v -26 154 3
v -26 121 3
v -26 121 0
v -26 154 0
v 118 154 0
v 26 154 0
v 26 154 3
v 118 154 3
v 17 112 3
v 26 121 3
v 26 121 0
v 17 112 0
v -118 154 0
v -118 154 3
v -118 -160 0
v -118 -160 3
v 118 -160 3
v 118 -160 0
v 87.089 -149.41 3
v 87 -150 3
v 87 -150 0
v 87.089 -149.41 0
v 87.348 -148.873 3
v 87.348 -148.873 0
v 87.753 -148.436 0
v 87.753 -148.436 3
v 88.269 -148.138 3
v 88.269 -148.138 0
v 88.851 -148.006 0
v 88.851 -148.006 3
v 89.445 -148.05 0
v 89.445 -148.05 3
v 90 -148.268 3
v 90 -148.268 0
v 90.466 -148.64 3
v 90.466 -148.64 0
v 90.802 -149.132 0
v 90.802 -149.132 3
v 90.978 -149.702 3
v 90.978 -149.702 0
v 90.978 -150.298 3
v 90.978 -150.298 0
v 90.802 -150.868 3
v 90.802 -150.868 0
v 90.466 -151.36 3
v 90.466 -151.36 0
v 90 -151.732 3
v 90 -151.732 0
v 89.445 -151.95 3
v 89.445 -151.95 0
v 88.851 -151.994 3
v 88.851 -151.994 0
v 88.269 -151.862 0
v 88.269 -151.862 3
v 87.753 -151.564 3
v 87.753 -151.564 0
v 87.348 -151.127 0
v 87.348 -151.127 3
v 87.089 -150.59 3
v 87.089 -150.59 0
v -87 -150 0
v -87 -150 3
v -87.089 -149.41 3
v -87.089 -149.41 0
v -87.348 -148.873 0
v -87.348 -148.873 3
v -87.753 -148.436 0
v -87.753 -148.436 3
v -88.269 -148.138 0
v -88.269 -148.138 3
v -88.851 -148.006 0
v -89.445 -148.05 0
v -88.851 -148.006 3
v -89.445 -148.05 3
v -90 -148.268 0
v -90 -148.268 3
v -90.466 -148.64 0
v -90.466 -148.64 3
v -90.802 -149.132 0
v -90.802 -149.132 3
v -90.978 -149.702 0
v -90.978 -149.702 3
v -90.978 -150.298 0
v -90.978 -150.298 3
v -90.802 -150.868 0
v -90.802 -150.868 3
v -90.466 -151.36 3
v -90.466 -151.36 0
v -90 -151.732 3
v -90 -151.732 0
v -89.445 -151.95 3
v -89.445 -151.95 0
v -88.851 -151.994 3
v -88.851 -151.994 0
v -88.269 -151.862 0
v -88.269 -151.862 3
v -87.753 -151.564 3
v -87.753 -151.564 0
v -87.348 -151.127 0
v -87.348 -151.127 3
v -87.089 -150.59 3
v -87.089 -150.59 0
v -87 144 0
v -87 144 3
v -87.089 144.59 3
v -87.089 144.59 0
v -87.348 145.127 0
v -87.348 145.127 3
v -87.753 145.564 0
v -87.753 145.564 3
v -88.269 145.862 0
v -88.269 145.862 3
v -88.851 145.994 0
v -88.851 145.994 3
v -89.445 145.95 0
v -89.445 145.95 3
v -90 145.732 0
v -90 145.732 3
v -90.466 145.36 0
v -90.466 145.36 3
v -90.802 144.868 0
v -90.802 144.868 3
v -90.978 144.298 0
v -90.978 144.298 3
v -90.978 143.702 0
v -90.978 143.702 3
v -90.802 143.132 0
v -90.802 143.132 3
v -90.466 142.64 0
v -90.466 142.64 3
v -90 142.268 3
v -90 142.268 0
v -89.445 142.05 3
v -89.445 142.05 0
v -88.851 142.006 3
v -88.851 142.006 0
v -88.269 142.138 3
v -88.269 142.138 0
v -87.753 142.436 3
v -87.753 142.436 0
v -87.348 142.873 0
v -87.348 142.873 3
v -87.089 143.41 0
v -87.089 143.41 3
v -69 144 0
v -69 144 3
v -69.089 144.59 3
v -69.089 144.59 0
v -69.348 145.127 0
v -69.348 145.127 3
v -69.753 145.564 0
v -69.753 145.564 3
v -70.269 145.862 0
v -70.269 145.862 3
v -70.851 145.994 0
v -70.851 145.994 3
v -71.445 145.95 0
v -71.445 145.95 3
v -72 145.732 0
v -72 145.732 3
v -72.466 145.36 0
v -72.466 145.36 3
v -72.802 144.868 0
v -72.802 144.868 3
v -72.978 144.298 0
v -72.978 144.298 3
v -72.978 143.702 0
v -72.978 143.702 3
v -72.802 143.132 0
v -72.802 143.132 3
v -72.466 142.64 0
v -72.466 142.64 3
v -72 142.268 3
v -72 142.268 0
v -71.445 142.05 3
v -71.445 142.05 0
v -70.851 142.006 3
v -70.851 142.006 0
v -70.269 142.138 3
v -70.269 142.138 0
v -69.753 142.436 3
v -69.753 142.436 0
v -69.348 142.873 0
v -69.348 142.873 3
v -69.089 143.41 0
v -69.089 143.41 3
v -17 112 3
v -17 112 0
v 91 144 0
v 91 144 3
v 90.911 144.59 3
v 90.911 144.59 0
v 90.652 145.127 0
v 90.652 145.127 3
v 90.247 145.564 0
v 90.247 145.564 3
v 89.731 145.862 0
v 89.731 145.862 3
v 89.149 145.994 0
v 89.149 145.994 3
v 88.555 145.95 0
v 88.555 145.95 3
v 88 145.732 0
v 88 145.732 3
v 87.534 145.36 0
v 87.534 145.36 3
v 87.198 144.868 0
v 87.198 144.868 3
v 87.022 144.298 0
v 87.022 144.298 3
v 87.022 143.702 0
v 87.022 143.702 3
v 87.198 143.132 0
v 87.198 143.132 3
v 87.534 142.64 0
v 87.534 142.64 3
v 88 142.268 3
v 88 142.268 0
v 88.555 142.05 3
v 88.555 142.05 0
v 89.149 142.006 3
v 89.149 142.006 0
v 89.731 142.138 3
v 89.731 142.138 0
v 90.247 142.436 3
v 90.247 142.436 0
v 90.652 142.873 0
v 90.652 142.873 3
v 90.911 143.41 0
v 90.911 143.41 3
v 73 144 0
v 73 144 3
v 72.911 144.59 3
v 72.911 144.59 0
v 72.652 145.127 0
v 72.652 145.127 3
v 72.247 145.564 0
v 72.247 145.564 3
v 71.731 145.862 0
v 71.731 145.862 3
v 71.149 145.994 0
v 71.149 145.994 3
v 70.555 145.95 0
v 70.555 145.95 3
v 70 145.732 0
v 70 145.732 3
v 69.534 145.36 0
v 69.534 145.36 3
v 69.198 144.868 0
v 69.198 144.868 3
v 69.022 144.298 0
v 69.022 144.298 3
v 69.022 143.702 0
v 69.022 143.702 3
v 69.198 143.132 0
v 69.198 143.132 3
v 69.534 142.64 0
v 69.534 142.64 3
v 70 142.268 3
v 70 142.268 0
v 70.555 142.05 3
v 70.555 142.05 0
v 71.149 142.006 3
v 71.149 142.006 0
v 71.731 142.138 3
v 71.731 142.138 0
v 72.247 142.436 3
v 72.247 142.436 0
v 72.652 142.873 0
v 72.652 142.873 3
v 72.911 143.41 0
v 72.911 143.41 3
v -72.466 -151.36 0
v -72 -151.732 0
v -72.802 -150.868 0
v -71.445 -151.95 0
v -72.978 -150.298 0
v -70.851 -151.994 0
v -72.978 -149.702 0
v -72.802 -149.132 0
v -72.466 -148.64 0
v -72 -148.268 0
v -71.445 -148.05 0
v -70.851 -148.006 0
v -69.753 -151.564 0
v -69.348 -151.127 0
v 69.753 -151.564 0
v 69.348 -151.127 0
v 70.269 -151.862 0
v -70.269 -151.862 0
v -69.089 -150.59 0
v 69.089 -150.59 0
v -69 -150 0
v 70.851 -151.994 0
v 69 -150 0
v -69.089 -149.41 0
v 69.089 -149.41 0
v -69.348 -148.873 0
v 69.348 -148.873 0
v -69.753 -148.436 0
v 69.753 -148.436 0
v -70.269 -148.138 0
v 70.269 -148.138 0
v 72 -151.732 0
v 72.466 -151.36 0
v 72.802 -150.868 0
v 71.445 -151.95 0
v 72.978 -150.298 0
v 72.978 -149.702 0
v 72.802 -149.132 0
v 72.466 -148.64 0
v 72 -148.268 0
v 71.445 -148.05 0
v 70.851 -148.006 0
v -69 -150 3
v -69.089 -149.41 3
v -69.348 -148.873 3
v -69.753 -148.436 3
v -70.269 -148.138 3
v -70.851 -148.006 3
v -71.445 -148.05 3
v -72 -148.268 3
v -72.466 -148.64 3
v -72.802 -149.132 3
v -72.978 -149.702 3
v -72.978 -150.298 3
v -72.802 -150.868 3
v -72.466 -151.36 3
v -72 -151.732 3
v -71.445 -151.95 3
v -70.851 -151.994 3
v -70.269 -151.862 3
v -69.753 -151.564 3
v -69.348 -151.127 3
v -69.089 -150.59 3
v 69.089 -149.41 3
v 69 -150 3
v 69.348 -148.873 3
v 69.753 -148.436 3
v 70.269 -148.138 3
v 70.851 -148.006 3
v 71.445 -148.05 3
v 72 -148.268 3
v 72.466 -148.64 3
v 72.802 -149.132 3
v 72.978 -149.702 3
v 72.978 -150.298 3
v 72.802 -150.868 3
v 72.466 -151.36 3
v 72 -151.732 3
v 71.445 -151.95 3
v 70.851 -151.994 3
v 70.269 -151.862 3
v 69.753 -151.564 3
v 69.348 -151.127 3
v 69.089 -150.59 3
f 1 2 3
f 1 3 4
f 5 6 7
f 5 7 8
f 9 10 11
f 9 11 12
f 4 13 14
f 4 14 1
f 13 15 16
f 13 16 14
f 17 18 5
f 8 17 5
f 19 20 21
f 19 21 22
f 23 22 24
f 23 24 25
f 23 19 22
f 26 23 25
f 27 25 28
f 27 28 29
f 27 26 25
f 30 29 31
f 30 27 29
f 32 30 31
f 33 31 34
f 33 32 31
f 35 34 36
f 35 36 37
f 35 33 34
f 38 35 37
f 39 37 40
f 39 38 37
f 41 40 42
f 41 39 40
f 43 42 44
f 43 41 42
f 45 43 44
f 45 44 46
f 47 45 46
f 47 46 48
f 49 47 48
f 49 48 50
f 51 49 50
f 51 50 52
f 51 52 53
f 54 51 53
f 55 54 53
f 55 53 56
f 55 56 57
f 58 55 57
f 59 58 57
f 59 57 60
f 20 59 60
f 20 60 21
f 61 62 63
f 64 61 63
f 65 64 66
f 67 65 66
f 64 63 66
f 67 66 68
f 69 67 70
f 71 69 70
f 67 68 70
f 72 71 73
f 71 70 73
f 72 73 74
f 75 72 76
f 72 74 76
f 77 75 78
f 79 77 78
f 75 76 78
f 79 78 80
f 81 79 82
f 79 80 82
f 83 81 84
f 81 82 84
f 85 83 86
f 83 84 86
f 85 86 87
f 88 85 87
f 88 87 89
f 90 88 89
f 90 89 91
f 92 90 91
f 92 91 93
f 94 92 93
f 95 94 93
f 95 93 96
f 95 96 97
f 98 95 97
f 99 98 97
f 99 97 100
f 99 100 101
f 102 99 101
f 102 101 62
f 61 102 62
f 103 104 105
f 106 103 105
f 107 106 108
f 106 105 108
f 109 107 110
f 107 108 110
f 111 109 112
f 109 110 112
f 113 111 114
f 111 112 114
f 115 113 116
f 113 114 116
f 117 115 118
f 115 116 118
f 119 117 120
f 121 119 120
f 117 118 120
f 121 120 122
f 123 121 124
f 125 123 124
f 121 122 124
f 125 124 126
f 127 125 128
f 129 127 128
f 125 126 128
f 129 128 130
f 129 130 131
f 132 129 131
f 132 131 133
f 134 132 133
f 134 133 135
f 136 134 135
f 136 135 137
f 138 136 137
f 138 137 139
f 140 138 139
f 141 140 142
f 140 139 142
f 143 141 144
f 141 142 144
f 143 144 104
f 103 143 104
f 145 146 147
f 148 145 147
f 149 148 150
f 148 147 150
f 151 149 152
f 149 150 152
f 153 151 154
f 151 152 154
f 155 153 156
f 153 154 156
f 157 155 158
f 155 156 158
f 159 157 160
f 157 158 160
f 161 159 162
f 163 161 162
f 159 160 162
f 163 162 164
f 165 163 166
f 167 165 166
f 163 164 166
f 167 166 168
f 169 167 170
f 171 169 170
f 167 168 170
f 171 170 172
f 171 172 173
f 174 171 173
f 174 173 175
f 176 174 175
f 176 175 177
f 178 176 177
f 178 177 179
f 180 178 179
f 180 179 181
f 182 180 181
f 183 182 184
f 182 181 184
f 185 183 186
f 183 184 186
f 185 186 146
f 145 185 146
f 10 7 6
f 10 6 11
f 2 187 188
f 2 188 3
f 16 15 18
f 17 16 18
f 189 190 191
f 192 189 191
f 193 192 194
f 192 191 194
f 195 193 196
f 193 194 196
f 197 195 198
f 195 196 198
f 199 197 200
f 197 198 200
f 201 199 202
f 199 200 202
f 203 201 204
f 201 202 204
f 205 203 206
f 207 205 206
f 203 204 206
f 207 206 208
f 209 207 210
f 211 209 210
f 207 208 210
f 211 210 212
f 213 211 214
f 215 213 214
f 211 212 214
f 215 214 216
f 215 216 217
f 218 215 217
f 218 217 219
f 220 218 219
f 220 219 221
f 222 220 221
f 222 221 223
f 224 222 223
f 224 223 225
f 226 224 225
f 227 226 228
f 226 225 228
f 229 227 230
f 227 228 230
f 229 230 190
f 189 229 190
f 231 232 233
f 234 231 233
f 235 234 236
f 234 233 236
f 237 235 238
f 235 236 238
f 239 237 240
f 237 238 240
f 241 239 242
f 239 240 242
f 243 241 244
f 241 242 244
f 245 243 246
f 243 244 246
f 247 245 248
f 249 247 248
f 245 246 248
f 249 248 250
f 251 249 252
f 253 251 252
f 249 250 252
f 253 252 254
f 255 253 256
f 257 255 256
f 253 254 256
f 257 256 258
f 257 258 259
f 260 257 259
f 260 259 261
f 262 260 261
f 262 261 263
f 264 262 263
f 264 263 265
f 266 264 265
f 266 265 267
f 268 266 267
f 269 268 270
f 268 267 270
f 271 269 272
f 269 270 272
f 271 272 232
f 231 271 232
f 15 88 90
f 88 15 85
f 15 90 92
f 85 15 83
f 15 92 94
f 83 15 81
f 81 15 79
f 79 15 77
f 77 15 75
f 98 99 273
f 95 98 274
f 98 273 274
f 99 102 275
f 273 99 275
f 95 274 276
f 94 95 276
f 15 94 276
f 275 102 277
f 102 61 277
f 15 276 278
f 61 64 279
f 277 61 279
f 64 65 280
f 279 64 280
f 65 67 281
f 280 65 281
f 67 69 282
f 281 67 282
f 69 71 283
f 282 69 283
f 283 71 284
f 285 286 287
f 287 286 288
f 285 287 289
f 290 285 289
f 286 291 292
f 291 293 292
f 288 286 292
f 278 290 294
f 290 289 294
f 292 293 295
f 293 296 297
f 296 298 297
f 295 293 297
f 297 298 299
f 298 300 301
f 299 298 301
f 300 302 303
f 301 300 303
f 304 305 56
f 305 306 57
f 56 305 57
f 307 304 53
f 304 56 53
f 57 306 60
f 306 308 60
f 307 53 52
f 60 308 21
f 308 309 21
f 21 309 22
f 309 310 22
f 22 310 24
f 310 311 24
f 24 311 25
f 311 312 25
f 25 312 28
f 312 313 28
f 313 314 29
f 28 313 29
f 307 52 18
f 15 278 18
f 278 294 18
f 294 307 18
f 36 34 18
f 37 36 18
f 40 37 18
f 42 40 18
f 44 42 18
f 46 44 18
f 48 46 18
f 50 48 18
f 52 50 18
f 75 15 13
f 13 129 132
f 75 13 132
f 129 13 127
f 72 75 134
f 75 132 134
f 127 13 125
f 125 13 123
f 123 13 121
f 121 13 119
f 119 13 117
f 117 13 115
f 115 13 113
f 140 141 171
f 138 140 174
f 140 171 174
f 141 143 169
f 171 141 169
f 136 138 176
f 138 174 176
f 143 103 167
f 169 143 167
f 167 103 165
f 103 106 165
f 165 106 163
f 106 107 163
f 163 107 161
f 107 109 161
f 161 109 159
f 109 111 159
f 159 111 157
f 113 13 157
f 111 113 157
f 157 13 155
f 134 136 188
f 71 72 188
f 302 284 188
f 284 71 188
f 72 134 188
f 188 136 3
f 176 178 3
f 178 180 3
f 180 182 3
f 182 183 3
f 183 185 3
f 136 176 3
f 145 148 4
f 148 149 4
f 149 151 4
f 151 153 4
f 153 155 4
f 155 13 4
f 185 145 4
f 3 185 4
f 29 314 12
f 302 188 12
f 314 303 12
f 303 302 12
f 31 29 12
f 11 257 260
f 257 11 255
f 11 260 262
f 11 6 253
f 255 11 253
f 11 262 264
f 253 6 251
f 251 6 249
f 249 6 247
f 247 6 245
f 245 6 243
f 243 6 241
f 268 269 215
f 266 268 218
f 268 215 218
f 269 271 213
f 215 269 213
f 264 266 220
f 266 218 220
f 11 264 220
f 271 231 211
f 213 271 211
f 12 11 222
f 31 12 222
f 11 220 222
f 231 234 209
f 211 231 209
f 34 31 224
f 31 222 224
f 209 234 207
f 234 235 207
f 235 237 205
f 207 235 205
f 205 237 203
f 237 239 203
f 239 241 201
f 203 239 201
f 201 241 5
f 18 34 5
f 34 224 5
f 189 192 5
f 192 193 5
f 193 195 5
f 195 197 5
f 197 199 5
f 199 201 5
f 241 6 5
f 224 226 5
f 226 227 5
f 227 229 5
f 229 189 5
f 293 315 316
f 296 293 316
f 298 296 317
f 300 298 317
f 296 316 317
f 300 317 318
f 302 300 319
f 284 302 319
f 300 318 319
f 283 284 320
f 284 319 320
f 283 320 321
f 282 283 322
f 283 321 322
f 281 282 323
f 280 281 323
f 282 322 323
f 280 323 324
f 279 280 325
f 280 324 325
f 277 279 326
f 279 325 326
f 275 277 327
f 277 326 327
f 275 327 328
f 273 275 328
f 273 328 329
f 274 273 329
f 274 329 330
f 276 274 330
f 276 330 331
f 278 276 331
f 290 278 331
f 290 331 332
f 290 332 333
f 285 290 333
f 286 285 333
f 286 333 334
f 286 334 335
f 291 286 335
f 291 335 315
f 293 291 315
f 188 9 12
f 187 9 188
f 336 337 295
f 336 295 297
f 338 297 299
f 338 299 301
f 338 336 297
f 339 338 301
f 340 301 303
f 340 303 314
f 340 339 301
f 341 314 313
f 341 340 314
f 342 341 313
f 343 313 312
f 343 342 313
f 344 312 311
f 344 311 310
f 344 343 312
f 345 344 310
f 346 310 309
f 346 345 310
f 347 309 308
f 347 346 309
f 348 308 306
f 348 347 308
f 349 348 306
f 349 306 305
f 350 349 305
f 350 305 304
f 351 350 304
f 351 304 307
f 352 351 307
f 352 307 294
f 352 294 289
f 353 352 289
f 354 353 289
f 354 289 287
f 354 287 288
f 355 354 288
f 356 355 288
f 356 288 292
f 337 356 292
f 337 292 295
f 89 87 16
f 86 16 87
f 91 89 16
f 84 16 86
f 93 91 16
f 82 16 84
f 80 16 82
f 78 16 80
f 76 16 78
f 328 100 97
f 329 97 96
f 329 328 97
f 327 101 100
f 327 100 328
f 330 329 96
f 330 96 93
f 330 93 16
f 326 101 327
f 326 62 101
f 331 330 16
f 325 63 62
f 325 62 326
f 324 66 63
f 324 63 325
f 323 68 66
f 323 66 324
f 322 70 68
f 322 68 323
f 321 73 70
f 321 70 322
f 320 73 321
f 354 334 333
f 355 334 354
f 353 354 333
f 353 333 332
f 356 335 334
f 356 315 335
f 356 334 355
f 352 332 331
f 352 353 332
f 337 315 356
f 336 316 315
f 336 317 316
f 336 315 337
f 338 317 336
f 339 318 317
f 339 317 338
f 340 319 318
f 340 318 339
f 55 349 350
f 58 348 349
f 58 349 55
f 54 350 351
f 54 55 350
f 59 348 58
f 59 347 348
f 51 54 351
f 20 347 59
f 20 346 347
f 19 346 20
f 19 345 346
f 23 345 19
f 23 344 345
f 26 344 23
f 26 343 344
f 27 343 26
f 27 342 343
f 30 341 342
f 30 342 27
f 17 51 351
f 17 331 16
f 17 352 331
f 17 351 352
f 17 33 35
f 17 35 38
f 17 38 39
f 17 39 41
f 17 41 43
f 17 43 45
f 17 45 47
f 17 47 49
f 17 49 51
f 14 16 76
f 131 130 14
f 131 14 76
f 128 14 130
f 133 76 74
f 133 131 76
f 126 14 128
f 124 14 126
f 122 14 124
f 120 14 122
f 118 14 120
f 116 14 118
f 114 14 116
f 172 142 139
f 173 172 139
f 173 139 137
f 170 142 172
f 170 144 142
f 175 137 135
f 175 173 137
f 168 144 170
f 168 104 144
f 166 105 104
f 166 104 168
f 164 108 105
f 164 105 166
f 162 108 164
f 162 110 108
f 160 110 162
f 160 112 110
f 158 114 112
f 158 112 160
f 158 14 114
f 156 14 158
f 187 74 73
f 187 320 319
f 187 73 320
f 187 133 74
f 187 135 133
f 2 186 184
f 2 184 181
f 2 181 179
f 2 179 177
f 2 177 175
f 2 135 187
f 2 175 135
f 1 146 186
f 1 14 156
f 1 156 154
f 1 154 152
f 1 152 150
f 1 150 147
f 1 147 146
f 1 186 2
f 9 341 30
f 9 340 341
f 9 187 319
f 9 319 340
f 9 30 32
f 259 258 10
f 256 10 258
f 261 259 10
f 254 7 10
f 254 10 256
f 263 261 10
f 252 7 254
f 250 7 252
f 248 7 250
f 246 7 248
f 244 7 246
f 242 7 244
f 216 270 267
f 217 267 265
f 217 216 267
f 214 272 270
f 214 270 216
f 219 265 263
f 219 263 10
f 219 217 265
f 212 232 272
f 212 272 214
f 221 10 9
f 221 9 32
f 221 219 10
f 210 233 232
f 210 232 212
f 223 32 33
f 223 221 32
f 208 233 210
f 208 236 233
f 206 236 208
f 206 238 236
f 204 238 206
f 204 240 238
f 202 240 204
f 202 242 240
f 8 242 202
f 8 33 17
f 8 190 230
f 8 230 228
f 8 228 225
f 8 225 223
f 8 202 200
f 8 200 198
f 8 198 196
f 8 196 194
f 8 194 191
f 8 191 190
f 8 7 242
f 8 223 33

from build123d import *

# Parameters (mm, degrees)
ESQUISSE1_W             = 236
ESQUISSE1_H             = 314
BOSS_EXTRU_1_DEPTH      = 3
ENL_V_MAT_EXTRU_1_REACH = 200.829
ESQUISSE3_R             = 2
ENL_V_MAT_EXTRU_2_REACH = 200.829


with BuildPart() as part:
    # Esquisse1 → Boss.-Extru.1 (new body)
    with BuildSketch(Plane.XY):
        with Locations((0, -3)):
            Rectangle(ESQUISSE1_W, ESQUISSE1_H)
    extrude(amount=BOSS_EXTRU_1_DEPTH)

    # Esquisse3 → Enlèv. mat.-Extru.1 (cut, up to next)
    with BuildSketch(Plane.XY.offset(3), mode=Mode.PRIVATE) as enl_v_mat_extru_1_sk1:
        with Locations((-71, -150)):
            Circle(ESQUISSE3_R)
    enl_v_mat_extru_1_tool1 = extrude(enl_v_mat_extru_1_sk1.sketch, amount=-ENL_V_MAT_EXTRU_1_REACH, mode=Mode.PRIVATE) & part.part
    # Esquisse3 → Enlèv. mat.-Extru.1 (cut, up to next)
    with BuildSketch(Plane.XY.offset(3), mode=Mode.PRIVATE) as enl_v_mat_extru_1_sk2:
        with Locations((-89, -150)):
            Circle(ESQUISSE3_R)
    enl_v_mat_extru_1_tool2 = extrude(enl_v_mat_extru_1_sk2.sketch, amount=-ENL_V_MAT_EXTRU_1_REACH, mode=Mode.PRIVATE) & part.part
    # Esquisse3 → Enlèv. mat.-Extru.1 (cut, up to next)
    with BuildSketch(Plane.XY.offset(3), mode=Mode.PRIVATE) as enl_v_mat_extru_1_sk3:
        with Locations((-89, 144)):
            Circle(ESQUISSE3_R)
    enl_v_mat_extru_1_tool3 = extrude(enl_v_mat_extru_1_sk3.sketch, amount=-ENL_V_MAT_EXTRU_1_REACH, mode=Mode.PRIVATE) & part.part
    # Esquisse3 → Enlèv. mat.-Extru.1 (cut, up to next)
    with BuildSketch(Plane.XY.offset(3), mode=Mode.PRIVATE) as enl_v_mat_extru_1_sk4:
        with Locations((-71, 144)):
            Circle(ESQUISSE3_R)
    enl_v_mat_extru_1_tool4 = extrude(enl_v_mat_extru_1_sk4.sketch, amount=-ENL_V_MAT_EXTRU_1_REACH, mode=Mode.PRIVATE) & part.part
    # Esquisse3 → Enlèv. mat.-Extru.1 (cut, up to next)
    with BuildSketch(Plane.XY.offset(3), mode=Mode.PRIVATE) as enl_v_mat_extru_1_sk5:
        with Locations((71, 144)):
            Circle(ESQUISSE3_R)
    enl_v_mat_extru_1_tool5 = extrude(enl_v_mat_extru_1_sk5.sketch, amount=-ENL_V_MAT_EXTRU_1_REACH, mode=Mode.PRIVATE) & part.part
    # Esquisse3 → Enlèv. mat.-Extru.1 (cut, up to next)
    with BuildSketch(Plane.XY.offset(3), mode=Mode.PRIVATE) as enl_v_mat_extru_1_sk6:
        with Locations((89, 144)):
            Circle(ESQUISSE3_R)
    enl_v_mat_extru_1_tool6 = extrude(enl_v_mat_extru_1_sk6.sketch, amount=-ENL_V_MAT_EXTRU_1_REACH, mode=Mode.PRIVATE) & part.part
    enl_v_mat_extru_1_1 = enl_v_mat_extru_1_tool1.solids().sort_by_distance((-71, -150, 3))[0]
    add(enl_v_mat_extru_1_1, mode=Mode.SUBTRACT)
    enl_v_mat_extru_1_2 = enl_v_mat_extru_1_tool2.solids().sort_by_distance((-89, -150, 3))[0]
    add(enl_v_mat_extru_1_2, mode=Mode.SUBTRACT)
    enl_v_mat_extru_1_3 = enl_v_mat_extru_1_tool3.solids().sort_by_distance((-89, 144, 3))[0]
    add(enl_v_mat_extru_1_3, mode=Mode.SUBTRACT)
    enl_v_mat_extru_1_4 = enl_v_mat_extru_1_tool4.solids().sort_by_distance((-71, 144, 3))[0]
    add(enl_v_mat_extru_1_4, mode=Mode.SUBTRACT)
    enl_v_mat_extru_1_5 = enl_v_mat_extru_1_tool5.solids().sort_by_distance((71, 144, 3))[0]
    add(enl_v_mat_extru_1_5, mode=Mode.SUBTRACT)
    enl_v_mat_extru_1_6 = enl_v_mat_extru_1_tool6.solids().sort_by_distance((89, 144, 3))[0]
    add(enl_v_mat_extru_1_6, mode=Mode.SUBTRACT)
    enl_v_mat_extru_1 = enl_v_mat_extru_1_1 + enl_v_mat_extru_1_2 + enl_v_mat_extru_1_3 + enl_v_mat_extru_1_4 + enl_v_mat_extru_1_5 + enl_v_mat_extru_1_6  # Enlèv. mat.-Extru.1 as one shape, for the pattern or mirror that repeats it

    # Symétrie1: Enlèv. mat.-Extru.1 across plane
    add(enl_v_mat_extru_1.mirror(Plane(origin=(0, 0, 0), x_dir=(0, 0, 1), z_dir=(1, 0, 0))), mode=Mode.SUBTRACT)

    # Esquisse5 → Enlèv. mat.-Extru.2 (cut, up to next)
    with BuildSketch(Plane.XY.offset(3), mode=Mode.PRIVATE) as enl_v_mat_extru_2_sk1:
        Polygon((0, 154), (26, 154), (26, 121), (17, 112), (-17, 112), (-26, 121), (-26, 154), align=None)
    enl_v_mat_extru_2_tool1 = extrude(enl_v_mat_extru_2_sk1.sketch, amount=-ENL_V_MAT_EXTRU_2_REACH, mode=Mode.PRIVATE) & part.part
    add(enl_v_mat_extru_2_tool1.solids().sort_by_distance((0, 133.693295, 3))[0], mode=Mode.SUBTRACT)


solid = part.part
